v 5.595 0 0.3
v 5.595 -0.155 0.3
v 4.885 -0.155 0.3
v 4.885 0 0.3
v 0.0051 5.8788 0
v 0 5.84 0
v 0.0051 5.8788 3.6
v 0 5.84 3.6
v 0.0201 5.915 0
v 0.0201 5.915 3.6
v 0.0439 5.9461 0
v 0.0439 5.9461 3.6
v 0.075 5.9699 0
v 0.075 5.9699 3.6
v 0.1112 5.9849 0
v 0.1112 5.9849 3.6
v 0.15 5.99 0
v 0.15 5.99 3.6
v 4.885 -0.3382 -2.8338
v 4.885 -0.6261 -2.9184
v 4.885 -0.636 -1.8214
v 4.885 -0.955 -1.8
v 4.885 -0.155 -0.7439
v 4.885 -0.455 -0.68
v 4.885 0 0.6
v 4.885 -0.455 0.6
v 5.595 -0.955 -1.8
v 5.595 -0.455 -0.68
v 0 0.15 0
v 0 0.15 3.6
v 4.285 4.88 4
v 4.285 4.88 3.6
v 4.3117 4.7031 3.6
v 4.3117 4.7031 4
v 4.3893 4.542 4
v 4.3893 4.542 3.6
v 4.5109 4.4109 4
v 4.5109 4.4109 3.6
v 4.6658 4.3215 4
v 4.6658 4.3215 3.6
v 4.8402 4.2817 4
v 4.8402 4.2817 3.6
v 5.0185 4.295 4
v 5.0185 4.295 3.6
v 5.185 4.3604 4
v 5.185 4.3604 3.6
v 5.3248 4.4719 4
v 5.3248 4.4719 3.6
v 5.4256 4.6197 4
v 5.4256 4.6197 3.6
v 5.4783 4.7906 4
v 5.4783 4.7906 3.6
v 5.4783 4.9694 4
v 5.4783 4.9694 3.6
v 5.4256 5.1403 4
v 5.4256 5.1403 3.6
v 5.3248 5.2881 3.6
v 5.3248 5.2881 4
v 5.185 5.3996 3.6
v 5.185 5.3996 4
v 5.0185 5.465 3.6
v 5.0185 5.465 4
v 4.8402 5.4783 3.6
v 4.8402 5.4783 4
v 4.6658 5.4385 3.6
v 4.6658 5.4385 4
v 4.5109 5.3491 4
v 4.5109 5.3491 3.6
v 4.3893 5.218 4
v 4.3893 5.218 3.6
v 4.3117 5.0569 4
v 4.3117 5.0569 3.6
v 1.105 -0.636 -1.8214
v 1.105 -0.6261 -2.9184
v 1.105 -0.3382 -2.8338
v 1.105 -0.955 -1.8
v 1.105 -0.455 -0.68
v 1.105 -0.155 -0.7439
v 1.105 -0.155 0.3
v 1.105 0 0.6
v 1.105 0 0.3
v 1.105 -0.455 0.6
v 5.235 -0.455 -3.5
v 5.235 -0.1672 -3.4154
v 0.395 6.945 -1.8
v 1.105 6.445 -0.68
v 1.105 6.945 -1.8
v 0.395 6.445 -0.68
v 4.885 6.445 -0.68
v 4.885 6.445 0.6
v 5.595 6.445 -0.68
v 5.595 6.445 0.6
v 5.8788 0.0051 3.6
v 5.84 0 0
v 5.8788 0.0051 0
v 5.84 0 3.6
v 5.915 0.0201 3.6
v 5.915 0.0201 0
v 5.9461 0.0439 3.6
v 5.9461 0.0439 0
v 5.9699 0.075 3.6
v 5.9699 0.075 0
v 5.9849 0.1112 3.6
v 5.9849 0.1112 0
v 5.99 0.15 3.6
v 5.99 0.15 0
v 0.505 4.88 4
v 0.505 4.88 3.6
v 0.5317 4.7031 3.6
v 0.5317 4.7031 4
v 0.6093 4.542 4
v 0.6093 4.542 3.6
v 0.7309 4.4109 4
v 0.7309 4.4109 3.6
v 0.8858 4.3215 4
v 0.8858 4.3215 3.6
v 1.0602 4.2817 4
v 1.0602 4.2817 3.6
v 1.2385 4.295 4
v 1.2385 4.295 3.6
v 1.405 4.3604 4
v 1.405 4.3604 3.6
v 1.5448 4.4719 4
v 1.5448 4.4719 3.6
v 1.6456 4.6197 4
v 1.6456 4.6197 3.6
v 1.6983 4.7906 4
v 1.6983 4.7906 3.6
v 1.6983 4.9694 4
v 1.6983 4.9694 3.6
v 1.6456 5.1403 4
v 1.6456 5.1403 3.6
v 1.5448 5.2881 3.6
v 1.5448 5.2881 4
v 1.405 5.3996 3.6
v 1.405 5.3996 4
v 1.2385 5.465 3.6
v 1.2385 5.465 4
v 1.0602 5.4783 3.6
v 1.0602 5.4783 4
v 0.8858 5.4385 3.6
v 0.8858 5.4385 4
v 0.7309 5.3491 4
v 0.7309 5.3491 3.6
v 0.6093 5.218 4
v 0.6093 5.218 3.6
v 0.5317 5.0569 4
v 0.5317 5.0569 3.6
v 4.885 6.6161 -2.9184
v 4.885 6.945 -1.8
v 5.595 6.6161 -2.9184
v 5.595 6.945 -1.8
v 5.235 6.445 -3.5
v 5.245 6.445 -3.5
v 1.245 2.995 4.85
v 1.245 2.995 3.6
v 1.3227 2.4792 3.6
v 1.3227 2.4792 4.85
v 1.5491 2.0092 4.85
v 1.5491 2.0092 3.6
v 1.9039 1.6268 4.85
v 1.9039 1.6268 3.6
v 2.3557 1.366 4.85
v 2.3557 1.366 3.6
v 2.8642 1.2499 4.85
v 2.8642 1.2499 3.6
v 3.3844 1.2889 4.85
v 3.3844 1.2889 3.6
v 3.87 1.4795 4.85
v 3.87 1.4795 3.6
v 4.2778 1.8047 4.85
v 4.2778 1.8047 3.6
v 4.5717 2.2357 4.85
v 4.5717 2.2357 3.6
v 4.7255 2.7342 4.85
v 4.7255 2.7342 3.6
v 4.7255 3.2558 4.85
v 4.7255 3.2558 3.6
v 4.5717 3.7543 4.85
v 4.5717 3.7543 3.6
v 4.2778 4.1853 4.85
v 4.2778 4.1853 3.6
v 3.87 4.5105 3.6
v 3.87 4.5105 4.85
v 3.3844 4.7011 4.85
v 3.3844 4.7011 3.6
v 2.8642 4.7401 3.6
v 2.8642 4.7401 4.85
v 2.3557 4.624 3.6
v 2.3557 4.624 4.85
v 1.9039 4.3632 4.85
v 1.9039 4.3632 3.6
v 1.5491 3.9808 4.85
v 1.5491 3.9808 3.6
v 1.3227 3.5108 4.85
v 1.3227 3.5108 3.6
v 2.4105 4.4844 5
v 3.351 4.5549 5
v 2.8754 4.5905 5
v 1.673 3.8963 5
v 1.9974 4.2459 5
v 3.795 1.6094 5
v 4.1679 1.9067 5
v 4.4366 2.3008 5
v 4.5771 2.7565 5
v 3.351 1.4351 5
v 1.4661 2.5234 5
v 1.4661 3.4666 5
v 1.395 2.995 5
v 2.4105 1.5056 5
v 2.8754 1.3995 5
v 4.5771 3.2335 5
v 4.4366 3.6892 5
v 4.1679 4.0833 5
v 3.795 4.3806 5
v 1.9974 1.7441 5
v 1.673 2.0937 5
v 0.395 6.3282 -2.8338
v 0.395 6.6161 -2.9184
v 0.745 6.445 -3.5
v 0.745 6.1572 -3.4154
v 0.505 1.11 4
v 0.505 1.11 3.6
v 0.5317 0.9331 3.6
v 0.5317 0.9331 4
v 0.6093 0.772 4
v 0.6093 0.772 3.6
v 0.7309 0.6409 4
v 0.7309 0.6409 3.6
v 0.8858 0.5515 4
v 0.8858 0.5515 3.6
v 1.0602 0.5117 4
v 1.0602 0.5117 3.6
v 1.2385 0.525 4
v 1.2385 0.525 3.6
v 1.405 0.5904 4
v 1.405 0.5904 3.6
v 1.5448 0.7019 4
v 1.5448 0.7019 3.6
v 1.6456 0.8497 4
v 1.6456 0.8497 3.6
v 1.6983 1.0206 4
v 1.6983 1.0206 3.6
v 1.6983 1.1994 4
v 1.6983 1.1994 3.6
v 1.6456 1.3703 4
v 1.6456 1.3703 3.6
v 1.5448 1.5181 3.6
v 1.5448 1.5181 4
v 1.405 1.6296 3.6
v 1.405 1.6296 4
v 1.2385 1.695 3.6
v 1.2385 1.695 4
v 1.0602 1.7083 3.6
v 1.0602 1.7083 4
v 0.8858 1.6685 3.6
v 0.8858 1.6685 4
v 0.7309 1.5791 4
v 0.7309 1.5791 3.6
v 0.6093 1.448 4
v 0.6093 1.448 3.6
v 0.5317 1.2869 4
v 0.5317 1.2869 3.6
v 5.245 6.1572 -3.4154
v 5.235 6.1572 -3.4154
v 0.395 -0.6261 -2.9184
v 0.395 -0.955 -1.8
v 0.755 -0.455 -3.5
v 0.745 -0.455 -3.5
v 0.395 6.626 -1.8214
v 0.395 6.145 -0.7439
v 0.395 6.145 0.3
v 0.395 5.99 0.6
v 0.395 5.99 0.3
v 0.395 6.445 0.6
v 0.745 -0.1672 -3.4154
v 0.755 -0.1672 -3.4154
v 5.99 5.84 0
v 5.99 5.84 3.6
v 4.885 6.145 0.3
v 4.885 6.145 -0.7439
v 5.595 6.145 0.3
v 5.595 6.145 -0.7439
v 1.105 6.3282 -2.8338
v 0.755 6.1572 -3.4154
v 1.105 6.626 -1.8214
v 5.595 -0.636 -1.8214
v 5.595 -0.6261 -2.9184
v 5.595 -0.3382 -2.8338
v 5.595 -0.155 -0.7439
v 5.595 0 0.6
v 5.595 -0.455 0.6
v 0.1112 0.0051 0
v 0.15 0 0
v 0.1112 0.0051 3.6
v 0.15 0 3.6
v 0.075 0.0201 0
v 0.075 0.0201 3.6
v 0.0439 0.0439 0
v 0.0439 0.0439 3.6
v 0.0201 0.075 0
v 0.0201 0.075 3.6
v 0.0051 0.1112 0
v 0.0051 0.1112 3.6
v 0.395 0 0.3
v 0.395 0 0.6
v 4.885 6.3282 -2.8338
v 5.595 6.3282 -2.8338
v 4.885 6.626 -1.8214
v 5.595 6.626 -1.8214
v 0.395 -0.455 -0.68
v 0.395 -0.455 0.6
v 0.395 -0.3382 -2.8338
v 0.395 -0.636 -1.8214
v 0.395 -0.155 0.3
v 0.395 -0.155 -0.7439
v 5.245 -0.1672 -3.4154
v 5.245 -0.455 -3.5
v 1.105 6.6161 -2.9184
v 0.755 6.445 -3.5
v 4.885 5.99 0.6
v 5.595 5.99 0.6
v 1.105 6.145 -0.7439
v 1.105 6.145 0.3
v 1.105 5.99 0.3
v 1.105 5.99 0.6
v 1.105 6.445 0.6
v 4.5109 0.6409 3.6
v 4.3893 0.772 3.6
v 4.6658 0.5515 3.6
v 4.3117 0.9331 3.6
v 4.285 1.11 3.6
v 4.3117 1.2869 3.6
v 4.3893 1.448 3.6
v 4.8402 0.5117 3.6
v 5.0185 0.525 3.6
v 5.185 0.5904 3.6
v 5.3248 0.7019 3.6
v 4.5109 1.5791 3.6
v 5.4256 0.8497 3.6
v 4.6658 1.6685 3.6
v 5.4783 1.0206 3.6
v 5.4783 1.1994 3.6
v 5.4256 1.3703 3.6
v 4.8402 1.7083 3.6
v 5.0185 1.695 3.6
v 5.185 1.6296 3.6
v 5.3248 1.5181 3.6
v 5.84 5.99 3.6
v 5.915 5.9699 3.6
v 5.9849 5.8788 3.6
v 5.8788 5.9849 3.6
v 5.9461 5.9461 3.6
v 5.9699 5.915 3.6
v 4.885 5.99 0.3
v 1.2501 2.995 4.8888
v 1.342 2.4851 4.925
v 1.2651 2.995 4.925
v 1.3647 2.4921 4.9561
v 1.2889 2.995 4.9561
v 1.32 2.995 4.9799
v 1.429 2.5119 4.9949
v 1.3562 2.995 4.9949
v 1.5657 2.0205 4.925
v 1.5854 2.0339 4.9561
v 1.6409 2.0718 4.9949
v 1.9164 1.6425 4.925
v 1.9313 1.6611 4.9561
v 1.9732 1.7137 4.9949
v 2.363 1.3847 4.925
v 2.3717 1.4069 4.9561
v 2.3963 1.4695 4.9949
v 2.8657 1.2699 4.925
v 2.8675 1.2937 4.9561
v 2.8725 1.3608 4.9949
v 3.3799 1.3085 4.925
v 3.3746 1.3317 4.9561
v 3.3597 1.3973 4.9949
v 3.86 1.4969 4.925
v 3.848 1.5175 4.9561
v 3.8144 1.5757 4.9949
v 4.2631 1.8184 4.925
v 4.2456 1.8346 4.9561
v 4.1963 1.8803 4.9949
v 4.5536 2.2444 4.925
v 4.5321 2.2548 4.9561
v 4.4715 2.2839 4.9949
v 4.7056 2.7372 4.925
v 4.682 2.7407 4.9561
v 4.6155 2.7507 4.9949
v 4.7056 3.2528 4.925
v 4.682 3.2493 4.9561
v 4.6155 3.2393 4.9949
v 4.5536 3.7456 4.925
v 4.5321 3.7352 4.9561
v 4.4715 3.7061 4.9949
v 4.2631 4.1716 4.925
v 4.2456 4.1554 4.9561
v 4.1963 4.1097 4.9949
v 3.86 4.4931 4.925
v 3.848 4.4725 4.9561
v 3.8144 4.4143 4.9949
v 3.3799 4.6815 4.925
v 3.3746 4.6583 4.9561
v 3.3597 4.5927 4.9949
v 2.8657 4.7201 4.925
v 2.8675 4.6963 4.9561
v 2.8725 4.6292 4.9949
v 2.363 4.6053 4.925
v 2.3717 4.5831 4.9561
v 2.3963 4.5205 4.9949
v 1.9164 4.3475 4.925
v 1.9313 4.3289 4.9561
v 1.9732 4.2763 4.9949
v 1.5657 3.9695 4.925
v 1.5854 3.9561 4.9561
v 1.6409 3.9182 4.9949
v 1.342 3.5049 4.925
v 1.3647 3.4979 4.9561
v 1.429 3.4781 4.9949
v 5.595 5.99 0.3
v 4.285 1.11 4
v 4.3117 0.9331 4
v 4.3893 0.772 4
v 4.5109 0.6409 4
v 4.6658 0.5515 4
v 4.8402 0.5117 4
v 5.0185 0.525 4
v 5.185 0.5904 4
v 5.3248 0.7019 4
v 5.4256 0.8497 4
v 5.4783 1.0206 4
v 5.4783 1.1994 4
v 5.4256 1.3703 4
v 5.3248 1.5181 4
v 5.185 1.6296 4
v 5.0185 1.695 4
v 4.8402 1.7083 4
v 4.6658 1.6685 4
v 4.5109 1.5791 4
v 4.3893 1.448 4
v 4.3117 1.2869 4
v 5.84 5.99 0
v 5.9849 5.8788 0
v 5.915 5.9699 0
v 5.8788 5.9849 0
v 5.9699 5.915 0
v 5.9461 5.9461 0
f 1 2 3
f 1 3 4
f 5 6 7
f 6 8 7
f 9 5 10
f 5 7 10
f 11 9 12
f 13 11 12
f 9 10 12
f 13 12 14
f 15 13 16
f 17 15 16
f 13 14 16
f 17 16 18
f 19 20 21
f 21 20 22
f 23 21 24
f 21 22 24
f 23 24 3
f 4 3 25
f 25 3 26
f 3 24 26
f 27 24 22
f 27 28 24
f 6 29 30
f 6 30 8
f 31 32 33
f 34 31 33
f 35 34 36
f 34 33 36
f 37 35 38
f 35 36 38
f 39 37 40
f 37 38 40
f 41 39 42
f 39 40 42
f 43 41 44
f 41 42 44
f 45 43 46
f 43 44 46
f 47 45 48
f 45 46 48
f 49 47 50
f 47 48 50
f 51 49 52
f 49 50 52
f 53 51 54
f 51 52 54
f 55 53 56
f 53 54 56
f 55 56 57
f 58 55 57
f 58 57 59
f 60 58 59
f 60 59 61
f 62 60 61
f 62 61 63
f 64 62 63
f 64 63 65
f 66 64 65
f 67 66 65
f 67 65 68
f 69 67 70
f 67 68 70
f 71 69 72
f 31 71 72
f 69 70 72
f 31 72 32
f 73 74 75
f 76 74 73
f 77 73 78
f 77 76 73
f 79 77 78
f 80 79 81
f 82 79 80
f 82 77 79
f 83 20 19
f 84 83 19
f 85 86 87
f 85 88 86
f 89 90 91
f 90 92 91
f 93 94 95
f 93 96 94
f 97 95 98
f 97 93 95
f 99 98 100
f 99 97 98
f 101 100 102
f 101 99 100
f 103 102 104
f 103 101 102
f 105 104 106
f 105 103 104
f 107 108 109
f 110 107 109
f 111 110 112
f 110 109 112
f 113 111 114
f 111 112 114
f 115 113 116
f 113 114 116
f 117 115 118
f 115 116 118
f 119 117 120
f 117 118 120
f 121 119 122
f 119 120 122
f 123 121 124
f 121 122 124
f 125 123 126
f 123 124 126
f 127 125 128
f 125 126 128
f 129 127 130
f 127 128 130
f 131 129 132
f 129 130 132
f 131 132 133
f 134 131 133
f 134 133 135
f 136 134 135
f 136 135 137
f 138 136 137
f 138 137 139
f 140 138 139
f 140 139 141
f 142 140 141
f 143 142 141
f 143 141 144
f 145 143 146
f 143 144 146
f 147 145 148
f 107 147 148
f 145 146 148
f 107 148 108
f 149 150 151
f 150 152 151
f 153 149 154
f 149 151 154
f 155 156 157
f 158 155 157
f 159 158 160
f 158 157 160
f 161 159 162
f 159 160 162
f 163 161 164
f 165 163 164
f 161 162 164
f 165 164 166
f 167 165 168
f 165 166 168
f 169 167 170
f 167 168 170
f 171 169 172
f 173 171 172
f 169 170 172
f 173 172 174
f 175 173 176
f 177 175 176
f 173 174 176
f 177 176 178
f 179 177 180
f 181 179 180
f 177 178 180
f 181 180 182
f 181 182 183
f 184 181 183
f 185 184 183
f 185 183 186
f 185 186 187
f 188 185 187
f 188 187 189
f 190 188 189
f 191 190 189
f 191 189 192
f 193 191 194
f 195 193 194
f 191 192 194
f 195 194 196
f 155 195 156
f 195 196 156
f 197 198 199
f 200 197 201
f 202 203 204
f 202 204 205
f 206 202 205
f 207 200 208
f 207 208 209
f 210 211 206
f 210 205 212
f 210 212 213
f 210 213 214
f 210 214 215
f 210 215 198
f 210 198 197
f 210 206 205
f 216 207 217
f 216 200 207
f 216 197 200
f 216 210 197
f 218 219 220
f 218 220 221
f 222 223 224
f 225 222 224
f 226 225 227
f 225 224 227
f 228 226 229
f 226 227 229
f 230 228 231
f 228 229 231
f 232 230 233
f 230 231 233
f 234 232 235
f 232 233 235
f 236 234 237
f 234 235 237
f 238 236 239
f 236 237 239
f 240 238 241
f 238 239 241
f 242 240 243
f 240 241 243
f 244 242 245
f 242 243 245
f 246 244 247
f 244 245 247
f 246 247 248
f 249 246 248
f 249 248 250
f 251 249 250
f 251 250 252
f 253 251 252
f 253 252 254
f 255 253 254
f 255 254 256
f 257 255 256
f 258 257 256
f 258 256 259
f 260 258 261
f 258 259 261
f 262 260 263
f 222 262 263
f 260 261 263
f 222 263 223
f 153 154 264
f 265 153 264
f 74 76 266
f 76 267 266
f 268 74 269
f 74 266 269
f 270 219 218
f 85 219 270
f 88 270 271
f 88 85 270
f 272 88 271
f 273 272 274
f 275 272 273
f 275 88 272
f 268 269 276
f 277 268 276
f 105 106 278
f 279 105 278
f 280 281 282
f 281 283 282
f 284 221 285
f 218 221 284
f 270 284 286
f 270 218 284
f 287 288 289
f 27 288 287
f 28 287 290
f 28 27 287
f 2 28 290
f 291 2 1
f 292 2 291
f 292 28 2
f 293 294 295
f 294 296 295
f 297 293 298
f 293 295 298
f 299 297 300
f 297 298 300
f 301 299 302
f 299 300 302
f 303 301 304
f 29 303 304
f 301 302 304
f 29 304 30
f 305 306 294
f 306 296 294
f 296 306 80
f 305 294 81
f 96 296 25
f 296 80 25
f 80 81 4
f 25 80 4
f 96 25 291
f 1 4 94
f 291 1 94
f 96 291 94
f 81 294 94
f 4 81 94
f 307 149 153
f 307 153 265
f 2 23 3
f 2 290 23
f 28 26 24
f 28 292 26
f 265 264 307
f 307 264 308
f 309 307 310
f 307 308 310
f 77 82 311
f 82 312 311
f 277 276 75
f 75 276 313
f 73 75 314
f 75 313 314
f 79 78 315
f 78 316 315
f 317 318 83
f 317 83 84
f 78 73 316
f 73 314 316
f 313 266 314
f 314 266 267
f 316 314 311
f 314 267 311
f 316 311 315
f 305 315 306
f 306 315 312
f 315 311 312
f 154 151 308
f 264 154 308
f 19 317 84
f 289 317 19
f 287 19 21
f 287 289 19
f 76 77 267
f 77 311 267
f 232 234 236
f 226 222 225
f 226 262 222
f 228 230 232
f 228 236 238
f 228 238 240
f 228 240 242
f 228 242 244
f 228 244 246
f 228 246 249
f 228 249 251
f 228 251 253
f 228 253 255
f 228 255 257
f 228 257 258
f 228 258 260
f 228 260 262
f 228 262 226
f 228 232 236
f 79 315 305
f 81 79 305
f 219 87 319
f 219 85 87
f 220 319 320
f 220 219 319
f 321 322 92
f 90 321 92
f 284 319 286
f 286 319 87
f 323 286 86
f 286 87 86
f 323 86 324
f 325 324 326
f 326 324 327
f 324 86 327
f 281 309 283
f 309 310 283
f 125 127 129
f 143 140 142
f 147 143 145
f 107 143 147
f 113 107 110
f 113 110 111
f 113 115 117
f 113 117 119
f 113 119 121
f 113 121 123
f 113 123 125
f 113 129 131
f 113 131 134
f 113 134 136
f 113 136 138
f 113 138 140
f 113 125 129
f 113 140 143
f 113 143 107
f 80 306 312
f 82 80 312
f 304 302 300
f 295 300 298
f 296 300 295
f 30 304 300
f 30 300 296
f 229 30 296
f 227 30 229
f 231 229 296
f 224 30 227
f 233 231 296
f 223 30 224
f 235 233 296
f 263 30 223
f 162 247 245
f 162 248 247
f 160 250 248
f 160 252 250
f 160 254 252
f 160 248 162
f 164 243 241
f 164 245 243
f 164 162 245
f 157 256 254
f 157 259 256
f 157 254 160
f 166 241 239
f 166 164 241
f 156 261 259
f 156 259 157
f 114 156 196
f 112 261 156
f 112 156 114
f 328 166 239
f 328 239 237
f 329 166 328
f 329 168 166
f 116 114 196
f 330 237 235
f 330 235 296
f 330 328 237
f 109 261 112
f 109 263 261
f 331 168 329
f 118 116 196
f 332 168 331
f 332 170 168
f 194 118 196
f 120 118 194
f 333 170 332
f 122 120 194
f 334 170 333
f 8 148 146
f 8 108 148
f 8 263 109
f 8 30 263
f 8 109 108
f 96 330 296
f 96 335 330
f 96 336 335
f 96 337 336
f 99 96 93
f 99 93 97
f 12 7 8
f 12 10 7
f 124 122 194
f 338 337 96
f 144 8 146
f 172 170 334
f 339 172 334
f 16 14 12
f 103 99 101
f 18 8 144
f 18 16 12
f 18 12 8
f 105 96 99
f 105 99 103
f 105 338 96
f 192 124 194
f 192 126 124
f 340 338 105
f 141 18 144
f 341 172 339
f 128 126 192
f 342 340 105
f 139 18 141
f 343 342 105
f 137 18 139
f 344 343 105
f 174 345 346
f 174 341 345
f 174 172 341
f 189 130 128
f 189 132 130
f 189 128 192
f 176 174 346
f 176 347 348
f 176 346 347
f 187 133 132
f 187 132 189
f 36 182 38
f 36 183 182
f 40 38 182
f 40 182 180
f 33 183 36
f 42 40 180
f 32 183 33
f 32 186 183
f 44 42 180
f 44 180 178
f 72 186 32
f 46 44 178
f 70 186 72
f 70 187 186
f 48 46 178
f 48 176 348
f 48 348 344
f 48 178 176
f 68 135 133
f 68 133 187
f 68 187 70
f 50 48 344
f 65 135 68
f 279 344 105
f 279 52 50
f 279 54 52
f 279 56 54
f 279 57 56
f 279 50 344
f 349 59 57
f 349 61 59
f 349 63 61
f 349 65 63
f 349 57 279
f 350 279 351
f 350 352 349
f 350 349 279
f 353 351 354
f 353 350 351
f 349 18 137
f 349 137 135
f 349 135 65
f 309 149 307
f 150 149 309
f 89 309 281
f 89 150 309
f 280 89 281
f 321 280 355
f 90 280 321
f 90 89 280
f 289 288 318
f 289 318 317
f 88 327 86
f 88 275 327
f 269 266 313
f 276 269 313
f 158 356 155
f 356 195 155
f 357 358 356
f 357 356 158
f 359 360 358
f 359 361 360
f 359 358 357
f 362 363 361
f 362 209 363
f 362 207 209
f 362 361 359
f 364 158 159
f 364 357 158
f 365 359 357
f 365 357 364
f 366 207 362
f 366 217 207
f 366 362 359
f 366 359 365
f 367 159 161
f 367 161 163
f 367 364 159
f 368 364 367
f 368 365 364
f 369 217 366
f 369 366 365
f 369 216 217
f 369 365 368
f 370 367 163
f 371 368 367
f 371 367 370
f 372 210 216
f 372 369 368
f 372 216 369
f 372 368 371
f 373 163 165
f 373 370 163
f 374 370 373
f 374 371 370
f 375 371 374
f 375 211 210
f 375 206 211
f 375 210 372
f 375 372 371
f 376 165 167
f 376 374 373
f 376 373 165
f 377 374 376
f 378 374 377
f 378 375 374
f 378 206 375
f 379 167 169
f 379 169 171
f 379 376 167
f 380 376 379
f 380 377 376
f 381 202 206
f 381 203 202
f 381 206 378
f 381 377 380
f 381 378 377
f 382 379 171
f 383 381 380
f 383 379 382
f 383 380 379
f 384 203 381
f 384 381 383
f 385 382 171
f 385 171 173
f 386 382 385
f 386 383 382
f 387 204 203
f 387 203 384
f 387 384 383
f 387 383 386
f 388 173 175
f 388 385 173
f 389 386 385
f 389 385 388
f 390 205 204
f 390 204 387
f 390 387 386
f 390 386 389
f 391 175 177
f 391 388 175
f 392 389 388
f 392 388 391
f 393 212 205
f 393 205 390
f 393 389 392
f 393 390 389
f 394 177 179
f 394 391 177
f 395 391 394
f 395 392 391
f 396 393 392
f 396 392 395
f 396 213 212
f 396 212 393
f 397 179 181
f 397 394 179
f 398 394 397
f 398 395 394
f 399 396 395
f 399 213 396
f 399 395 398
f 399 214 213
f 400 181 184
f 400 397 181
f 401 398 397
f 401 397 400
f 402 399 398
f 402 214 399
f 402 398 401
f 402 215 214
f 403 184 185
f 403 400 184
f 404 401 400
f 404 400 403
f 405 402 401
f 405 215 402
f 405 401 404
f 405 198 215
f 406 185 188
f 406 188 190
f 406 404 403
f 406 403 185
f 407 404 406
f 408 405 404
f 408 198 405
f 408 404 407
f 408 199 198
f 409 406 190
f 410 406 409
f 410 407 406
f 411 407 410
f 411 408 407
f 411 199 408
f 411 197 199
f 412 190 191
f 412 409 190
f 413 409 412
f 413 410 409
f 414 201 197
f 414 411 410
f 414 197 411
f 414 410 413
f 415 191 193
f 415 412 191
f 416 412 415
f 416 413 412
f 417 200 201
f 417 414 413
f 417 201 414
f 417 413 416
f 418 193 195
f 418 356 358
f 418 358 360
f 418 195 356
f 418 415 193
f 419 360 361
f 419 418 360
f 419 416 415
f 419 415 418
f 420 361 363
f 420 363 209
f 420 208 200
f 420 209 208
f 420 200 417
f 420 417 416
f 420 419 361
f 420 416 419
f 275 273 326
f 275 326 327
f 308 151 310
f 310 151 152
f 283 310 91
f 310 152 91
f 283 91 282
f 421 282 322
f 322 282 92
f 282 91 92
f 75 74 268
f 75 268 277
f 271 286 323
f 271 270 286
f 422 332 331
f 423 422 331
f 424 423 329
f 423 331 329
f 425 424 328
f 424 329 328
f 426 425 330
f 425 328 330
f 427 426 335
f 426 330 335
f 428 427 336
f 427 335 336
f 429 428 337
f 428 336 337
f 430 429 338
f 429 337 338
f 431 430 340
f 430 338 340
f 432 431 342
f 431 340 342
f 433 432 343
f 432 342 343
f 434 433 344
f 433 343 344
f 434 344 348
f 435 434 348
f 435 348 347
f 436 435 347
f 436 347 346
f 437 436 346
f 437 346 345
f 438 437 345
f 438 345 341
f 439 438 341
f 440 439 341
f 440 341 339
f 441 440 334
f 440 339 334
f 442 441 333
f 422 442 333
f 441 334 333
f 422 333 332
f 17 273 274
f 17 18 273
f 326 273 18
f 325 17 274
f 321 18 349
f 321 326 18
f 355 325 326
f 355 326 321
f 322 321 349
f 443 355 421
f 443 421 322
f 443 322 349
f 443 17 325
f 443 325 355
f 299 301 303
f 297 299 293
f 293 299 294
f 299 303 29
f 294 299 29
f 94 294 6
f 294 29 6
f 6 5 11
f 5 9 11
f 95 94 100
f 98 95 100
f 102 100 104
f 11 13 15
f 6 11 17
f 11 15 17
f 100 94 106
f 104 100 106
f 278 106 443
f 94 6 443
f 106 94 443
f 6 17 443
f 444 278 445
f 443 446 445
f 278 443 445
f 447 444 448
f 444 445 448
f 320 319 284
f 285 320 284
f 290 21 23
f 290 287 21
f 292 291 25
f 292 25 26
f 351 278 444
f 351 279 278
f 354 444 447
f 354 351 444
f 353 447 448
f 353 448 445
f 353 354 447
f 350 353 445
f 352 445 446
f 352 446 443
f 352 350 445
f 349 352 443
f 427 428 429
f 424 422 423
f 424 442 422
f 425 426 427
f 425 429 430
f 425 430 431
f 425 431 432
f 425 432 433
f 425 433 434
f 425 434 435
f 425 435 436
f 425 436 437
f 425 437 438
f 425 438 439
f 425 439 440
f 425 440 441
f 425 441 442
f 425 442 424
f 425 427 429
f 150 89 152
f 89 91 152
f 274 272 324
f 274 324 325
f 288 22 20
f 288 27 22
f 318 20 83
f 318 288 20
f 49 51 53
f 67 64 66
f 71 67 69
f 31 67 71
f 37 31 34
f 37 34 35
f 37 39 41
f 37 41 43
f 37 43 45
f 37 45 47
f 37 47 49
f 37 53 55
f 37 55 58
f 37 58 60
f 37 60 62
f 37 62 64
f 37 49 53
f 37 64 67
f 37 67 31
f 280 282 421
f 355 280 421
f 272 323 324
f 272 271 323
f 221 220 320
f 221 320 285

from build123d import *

# Parameters (mm, degrees)
SKETCH2_W                 = 5.99
SKETCH2_H                 = 5.99
BOSS_EXTRUDE1_DEPTH       = 3.6
SKETCH3_R                 = 1.75
BOSS_EXTRUDE2_DEPTH       = 1.4
EXTRUDE_THIN1_DEPTH       = 0.355
CHAMFER2_SIZE             = 0.35
CHAMFER2_SIZE2            = 0.606217783
CHAMFER2_OF_MIRROR1_SIZE2 = 0.35
CHAMFER2_OF_MIRROR1_SIZE  = 0.606217783
FILLET1_R                 = 0.15
SKETCH5_R                 = 0.6
BOSS_EXTRUDE3_DEPTH       = 0.4


# Read off the part's stored shape, not the designer's step: Mirror2
with BuildPart() as part:
    # Sketch2 → Boss-Extrude1 (new body)
    with BuildSketch(Plane.XY):
        with Locations((2.995, 2.995)):
            Rectangle(SKETCH2_W, SKETCH2_H)
    extrude(amount=BOSS_EXTRUDE1_DEPTH)

    # Sketch3 → Boss-Extrude2 (add)
    with BuildSketch(Plane.XY.offset(3.6)):
        with Locations(Location((2.995, 2.995, 0), (0, 0, 180))):
            Circle(SKETCH3_R)
    extrude(amount=BOSS_EXTRUDE2_DEPTH)

    # Sketch4 → Extrude-Thin1 (add, symmetric)
    with BuildSketch(Plane(origin=(5.24, 0, 0), x_dir=(0, 0, -1), z_dir=(1, 0, 0))):
        Polygon((-0.6, 5.99), (-0.6, 6.445), (0.68, 6.445), (1.8, 6.945), (3.5, 6.445), (3.415350103, 6.15719035), (1.821377167, 6.626005919), (0.743923909, 6.145), (-0.3, 6.145), (-0.3, 5.99), align=None)
    extrude_thin1 = extrude(amount=EXTRUDE_THIN1_DEPTH, both=True)

    # Chamfer2
    chamfer2_edges = [part.edges().sort_by_distance(p)[0] for p in [
        (5.595, 6.301095175, -3.457675051),
        (4.885, 6.301095175, -3.457675051),
    ]]
    chamfer2_side = [part.faces().sort_by_distance(p)[0] for p in [
        (5.24, 6.301095175, -3.457675051),
    ]]
    chamfer(chamfer2_edges, length=CHAMFER2_SIZE, length2=CHAMFER2_SIZE2, reference=chamfer2_side[0])

    # Mirror1: Extrude-Thin1 across plane
    add(extrude_thin1.mirror(Plane(origin=(2.995, 0, 0), x_dir=(0, 0, 1), z_dir=(1, 0, 0))))

    # Chamfer2 of Mirror1
    chamfer2_of_mirror1_edges = [part.edges().sort_by_distance(p)[0] for p in [
        (0.395, 6.301095175, -3.457675051),
        (1.105, 6.301095175, -3.457675051),
    ]]
    chamfer(chamfer2_of_mirror1_edges, length=CHAMFER2_OF_MIRROR1_SIZE, length2=CHAMFER2_OF_MIRROR1_SIZE2)

    # Mirror2: part across plane


with BuildPart() as part_1:
    add(part.part)
    add(part.part.mirror(Plane.ZX.offset(2.995)))

    # Fillet1
    fillet1_edges = [part_1.edges().sort_by_distance(p)[0] for p in [
        (4.745, 2.995, 5),
        (0, 5.99, 1.8),
        (5.99, 5.99, 1.8),
        (5.99, 0, 1.8),
        (0, 0, 1.8),
    ]]
    fillet(fillet1_edges, radius=FILLET1_R)

    # Sketch5 → Boss-Extrude3 (add)
    with BuildSketch(Plane.XY.offset(3.6)):
        with Locations(Location((1.105, 4.88, 0), (0, 0, 180))):
            Circle(SKETCH5_R)
        with Locations(Location((4.885, 4.88, 0), (0, 0, 180))):
            Circle(SKETCH5_R)
        with Locations(Location((4.885, 1.11, 0), (0, 0, 180))):
            Circle(SKETCH5_R)
        with Locations(Location((1.105, 1.11, 0), (0, 0, 180))):
            Circle(SKETCH5_R)
    extrude(amount=BOSS_EXTRUDE3_DEPTH)


solid = part_1.part
